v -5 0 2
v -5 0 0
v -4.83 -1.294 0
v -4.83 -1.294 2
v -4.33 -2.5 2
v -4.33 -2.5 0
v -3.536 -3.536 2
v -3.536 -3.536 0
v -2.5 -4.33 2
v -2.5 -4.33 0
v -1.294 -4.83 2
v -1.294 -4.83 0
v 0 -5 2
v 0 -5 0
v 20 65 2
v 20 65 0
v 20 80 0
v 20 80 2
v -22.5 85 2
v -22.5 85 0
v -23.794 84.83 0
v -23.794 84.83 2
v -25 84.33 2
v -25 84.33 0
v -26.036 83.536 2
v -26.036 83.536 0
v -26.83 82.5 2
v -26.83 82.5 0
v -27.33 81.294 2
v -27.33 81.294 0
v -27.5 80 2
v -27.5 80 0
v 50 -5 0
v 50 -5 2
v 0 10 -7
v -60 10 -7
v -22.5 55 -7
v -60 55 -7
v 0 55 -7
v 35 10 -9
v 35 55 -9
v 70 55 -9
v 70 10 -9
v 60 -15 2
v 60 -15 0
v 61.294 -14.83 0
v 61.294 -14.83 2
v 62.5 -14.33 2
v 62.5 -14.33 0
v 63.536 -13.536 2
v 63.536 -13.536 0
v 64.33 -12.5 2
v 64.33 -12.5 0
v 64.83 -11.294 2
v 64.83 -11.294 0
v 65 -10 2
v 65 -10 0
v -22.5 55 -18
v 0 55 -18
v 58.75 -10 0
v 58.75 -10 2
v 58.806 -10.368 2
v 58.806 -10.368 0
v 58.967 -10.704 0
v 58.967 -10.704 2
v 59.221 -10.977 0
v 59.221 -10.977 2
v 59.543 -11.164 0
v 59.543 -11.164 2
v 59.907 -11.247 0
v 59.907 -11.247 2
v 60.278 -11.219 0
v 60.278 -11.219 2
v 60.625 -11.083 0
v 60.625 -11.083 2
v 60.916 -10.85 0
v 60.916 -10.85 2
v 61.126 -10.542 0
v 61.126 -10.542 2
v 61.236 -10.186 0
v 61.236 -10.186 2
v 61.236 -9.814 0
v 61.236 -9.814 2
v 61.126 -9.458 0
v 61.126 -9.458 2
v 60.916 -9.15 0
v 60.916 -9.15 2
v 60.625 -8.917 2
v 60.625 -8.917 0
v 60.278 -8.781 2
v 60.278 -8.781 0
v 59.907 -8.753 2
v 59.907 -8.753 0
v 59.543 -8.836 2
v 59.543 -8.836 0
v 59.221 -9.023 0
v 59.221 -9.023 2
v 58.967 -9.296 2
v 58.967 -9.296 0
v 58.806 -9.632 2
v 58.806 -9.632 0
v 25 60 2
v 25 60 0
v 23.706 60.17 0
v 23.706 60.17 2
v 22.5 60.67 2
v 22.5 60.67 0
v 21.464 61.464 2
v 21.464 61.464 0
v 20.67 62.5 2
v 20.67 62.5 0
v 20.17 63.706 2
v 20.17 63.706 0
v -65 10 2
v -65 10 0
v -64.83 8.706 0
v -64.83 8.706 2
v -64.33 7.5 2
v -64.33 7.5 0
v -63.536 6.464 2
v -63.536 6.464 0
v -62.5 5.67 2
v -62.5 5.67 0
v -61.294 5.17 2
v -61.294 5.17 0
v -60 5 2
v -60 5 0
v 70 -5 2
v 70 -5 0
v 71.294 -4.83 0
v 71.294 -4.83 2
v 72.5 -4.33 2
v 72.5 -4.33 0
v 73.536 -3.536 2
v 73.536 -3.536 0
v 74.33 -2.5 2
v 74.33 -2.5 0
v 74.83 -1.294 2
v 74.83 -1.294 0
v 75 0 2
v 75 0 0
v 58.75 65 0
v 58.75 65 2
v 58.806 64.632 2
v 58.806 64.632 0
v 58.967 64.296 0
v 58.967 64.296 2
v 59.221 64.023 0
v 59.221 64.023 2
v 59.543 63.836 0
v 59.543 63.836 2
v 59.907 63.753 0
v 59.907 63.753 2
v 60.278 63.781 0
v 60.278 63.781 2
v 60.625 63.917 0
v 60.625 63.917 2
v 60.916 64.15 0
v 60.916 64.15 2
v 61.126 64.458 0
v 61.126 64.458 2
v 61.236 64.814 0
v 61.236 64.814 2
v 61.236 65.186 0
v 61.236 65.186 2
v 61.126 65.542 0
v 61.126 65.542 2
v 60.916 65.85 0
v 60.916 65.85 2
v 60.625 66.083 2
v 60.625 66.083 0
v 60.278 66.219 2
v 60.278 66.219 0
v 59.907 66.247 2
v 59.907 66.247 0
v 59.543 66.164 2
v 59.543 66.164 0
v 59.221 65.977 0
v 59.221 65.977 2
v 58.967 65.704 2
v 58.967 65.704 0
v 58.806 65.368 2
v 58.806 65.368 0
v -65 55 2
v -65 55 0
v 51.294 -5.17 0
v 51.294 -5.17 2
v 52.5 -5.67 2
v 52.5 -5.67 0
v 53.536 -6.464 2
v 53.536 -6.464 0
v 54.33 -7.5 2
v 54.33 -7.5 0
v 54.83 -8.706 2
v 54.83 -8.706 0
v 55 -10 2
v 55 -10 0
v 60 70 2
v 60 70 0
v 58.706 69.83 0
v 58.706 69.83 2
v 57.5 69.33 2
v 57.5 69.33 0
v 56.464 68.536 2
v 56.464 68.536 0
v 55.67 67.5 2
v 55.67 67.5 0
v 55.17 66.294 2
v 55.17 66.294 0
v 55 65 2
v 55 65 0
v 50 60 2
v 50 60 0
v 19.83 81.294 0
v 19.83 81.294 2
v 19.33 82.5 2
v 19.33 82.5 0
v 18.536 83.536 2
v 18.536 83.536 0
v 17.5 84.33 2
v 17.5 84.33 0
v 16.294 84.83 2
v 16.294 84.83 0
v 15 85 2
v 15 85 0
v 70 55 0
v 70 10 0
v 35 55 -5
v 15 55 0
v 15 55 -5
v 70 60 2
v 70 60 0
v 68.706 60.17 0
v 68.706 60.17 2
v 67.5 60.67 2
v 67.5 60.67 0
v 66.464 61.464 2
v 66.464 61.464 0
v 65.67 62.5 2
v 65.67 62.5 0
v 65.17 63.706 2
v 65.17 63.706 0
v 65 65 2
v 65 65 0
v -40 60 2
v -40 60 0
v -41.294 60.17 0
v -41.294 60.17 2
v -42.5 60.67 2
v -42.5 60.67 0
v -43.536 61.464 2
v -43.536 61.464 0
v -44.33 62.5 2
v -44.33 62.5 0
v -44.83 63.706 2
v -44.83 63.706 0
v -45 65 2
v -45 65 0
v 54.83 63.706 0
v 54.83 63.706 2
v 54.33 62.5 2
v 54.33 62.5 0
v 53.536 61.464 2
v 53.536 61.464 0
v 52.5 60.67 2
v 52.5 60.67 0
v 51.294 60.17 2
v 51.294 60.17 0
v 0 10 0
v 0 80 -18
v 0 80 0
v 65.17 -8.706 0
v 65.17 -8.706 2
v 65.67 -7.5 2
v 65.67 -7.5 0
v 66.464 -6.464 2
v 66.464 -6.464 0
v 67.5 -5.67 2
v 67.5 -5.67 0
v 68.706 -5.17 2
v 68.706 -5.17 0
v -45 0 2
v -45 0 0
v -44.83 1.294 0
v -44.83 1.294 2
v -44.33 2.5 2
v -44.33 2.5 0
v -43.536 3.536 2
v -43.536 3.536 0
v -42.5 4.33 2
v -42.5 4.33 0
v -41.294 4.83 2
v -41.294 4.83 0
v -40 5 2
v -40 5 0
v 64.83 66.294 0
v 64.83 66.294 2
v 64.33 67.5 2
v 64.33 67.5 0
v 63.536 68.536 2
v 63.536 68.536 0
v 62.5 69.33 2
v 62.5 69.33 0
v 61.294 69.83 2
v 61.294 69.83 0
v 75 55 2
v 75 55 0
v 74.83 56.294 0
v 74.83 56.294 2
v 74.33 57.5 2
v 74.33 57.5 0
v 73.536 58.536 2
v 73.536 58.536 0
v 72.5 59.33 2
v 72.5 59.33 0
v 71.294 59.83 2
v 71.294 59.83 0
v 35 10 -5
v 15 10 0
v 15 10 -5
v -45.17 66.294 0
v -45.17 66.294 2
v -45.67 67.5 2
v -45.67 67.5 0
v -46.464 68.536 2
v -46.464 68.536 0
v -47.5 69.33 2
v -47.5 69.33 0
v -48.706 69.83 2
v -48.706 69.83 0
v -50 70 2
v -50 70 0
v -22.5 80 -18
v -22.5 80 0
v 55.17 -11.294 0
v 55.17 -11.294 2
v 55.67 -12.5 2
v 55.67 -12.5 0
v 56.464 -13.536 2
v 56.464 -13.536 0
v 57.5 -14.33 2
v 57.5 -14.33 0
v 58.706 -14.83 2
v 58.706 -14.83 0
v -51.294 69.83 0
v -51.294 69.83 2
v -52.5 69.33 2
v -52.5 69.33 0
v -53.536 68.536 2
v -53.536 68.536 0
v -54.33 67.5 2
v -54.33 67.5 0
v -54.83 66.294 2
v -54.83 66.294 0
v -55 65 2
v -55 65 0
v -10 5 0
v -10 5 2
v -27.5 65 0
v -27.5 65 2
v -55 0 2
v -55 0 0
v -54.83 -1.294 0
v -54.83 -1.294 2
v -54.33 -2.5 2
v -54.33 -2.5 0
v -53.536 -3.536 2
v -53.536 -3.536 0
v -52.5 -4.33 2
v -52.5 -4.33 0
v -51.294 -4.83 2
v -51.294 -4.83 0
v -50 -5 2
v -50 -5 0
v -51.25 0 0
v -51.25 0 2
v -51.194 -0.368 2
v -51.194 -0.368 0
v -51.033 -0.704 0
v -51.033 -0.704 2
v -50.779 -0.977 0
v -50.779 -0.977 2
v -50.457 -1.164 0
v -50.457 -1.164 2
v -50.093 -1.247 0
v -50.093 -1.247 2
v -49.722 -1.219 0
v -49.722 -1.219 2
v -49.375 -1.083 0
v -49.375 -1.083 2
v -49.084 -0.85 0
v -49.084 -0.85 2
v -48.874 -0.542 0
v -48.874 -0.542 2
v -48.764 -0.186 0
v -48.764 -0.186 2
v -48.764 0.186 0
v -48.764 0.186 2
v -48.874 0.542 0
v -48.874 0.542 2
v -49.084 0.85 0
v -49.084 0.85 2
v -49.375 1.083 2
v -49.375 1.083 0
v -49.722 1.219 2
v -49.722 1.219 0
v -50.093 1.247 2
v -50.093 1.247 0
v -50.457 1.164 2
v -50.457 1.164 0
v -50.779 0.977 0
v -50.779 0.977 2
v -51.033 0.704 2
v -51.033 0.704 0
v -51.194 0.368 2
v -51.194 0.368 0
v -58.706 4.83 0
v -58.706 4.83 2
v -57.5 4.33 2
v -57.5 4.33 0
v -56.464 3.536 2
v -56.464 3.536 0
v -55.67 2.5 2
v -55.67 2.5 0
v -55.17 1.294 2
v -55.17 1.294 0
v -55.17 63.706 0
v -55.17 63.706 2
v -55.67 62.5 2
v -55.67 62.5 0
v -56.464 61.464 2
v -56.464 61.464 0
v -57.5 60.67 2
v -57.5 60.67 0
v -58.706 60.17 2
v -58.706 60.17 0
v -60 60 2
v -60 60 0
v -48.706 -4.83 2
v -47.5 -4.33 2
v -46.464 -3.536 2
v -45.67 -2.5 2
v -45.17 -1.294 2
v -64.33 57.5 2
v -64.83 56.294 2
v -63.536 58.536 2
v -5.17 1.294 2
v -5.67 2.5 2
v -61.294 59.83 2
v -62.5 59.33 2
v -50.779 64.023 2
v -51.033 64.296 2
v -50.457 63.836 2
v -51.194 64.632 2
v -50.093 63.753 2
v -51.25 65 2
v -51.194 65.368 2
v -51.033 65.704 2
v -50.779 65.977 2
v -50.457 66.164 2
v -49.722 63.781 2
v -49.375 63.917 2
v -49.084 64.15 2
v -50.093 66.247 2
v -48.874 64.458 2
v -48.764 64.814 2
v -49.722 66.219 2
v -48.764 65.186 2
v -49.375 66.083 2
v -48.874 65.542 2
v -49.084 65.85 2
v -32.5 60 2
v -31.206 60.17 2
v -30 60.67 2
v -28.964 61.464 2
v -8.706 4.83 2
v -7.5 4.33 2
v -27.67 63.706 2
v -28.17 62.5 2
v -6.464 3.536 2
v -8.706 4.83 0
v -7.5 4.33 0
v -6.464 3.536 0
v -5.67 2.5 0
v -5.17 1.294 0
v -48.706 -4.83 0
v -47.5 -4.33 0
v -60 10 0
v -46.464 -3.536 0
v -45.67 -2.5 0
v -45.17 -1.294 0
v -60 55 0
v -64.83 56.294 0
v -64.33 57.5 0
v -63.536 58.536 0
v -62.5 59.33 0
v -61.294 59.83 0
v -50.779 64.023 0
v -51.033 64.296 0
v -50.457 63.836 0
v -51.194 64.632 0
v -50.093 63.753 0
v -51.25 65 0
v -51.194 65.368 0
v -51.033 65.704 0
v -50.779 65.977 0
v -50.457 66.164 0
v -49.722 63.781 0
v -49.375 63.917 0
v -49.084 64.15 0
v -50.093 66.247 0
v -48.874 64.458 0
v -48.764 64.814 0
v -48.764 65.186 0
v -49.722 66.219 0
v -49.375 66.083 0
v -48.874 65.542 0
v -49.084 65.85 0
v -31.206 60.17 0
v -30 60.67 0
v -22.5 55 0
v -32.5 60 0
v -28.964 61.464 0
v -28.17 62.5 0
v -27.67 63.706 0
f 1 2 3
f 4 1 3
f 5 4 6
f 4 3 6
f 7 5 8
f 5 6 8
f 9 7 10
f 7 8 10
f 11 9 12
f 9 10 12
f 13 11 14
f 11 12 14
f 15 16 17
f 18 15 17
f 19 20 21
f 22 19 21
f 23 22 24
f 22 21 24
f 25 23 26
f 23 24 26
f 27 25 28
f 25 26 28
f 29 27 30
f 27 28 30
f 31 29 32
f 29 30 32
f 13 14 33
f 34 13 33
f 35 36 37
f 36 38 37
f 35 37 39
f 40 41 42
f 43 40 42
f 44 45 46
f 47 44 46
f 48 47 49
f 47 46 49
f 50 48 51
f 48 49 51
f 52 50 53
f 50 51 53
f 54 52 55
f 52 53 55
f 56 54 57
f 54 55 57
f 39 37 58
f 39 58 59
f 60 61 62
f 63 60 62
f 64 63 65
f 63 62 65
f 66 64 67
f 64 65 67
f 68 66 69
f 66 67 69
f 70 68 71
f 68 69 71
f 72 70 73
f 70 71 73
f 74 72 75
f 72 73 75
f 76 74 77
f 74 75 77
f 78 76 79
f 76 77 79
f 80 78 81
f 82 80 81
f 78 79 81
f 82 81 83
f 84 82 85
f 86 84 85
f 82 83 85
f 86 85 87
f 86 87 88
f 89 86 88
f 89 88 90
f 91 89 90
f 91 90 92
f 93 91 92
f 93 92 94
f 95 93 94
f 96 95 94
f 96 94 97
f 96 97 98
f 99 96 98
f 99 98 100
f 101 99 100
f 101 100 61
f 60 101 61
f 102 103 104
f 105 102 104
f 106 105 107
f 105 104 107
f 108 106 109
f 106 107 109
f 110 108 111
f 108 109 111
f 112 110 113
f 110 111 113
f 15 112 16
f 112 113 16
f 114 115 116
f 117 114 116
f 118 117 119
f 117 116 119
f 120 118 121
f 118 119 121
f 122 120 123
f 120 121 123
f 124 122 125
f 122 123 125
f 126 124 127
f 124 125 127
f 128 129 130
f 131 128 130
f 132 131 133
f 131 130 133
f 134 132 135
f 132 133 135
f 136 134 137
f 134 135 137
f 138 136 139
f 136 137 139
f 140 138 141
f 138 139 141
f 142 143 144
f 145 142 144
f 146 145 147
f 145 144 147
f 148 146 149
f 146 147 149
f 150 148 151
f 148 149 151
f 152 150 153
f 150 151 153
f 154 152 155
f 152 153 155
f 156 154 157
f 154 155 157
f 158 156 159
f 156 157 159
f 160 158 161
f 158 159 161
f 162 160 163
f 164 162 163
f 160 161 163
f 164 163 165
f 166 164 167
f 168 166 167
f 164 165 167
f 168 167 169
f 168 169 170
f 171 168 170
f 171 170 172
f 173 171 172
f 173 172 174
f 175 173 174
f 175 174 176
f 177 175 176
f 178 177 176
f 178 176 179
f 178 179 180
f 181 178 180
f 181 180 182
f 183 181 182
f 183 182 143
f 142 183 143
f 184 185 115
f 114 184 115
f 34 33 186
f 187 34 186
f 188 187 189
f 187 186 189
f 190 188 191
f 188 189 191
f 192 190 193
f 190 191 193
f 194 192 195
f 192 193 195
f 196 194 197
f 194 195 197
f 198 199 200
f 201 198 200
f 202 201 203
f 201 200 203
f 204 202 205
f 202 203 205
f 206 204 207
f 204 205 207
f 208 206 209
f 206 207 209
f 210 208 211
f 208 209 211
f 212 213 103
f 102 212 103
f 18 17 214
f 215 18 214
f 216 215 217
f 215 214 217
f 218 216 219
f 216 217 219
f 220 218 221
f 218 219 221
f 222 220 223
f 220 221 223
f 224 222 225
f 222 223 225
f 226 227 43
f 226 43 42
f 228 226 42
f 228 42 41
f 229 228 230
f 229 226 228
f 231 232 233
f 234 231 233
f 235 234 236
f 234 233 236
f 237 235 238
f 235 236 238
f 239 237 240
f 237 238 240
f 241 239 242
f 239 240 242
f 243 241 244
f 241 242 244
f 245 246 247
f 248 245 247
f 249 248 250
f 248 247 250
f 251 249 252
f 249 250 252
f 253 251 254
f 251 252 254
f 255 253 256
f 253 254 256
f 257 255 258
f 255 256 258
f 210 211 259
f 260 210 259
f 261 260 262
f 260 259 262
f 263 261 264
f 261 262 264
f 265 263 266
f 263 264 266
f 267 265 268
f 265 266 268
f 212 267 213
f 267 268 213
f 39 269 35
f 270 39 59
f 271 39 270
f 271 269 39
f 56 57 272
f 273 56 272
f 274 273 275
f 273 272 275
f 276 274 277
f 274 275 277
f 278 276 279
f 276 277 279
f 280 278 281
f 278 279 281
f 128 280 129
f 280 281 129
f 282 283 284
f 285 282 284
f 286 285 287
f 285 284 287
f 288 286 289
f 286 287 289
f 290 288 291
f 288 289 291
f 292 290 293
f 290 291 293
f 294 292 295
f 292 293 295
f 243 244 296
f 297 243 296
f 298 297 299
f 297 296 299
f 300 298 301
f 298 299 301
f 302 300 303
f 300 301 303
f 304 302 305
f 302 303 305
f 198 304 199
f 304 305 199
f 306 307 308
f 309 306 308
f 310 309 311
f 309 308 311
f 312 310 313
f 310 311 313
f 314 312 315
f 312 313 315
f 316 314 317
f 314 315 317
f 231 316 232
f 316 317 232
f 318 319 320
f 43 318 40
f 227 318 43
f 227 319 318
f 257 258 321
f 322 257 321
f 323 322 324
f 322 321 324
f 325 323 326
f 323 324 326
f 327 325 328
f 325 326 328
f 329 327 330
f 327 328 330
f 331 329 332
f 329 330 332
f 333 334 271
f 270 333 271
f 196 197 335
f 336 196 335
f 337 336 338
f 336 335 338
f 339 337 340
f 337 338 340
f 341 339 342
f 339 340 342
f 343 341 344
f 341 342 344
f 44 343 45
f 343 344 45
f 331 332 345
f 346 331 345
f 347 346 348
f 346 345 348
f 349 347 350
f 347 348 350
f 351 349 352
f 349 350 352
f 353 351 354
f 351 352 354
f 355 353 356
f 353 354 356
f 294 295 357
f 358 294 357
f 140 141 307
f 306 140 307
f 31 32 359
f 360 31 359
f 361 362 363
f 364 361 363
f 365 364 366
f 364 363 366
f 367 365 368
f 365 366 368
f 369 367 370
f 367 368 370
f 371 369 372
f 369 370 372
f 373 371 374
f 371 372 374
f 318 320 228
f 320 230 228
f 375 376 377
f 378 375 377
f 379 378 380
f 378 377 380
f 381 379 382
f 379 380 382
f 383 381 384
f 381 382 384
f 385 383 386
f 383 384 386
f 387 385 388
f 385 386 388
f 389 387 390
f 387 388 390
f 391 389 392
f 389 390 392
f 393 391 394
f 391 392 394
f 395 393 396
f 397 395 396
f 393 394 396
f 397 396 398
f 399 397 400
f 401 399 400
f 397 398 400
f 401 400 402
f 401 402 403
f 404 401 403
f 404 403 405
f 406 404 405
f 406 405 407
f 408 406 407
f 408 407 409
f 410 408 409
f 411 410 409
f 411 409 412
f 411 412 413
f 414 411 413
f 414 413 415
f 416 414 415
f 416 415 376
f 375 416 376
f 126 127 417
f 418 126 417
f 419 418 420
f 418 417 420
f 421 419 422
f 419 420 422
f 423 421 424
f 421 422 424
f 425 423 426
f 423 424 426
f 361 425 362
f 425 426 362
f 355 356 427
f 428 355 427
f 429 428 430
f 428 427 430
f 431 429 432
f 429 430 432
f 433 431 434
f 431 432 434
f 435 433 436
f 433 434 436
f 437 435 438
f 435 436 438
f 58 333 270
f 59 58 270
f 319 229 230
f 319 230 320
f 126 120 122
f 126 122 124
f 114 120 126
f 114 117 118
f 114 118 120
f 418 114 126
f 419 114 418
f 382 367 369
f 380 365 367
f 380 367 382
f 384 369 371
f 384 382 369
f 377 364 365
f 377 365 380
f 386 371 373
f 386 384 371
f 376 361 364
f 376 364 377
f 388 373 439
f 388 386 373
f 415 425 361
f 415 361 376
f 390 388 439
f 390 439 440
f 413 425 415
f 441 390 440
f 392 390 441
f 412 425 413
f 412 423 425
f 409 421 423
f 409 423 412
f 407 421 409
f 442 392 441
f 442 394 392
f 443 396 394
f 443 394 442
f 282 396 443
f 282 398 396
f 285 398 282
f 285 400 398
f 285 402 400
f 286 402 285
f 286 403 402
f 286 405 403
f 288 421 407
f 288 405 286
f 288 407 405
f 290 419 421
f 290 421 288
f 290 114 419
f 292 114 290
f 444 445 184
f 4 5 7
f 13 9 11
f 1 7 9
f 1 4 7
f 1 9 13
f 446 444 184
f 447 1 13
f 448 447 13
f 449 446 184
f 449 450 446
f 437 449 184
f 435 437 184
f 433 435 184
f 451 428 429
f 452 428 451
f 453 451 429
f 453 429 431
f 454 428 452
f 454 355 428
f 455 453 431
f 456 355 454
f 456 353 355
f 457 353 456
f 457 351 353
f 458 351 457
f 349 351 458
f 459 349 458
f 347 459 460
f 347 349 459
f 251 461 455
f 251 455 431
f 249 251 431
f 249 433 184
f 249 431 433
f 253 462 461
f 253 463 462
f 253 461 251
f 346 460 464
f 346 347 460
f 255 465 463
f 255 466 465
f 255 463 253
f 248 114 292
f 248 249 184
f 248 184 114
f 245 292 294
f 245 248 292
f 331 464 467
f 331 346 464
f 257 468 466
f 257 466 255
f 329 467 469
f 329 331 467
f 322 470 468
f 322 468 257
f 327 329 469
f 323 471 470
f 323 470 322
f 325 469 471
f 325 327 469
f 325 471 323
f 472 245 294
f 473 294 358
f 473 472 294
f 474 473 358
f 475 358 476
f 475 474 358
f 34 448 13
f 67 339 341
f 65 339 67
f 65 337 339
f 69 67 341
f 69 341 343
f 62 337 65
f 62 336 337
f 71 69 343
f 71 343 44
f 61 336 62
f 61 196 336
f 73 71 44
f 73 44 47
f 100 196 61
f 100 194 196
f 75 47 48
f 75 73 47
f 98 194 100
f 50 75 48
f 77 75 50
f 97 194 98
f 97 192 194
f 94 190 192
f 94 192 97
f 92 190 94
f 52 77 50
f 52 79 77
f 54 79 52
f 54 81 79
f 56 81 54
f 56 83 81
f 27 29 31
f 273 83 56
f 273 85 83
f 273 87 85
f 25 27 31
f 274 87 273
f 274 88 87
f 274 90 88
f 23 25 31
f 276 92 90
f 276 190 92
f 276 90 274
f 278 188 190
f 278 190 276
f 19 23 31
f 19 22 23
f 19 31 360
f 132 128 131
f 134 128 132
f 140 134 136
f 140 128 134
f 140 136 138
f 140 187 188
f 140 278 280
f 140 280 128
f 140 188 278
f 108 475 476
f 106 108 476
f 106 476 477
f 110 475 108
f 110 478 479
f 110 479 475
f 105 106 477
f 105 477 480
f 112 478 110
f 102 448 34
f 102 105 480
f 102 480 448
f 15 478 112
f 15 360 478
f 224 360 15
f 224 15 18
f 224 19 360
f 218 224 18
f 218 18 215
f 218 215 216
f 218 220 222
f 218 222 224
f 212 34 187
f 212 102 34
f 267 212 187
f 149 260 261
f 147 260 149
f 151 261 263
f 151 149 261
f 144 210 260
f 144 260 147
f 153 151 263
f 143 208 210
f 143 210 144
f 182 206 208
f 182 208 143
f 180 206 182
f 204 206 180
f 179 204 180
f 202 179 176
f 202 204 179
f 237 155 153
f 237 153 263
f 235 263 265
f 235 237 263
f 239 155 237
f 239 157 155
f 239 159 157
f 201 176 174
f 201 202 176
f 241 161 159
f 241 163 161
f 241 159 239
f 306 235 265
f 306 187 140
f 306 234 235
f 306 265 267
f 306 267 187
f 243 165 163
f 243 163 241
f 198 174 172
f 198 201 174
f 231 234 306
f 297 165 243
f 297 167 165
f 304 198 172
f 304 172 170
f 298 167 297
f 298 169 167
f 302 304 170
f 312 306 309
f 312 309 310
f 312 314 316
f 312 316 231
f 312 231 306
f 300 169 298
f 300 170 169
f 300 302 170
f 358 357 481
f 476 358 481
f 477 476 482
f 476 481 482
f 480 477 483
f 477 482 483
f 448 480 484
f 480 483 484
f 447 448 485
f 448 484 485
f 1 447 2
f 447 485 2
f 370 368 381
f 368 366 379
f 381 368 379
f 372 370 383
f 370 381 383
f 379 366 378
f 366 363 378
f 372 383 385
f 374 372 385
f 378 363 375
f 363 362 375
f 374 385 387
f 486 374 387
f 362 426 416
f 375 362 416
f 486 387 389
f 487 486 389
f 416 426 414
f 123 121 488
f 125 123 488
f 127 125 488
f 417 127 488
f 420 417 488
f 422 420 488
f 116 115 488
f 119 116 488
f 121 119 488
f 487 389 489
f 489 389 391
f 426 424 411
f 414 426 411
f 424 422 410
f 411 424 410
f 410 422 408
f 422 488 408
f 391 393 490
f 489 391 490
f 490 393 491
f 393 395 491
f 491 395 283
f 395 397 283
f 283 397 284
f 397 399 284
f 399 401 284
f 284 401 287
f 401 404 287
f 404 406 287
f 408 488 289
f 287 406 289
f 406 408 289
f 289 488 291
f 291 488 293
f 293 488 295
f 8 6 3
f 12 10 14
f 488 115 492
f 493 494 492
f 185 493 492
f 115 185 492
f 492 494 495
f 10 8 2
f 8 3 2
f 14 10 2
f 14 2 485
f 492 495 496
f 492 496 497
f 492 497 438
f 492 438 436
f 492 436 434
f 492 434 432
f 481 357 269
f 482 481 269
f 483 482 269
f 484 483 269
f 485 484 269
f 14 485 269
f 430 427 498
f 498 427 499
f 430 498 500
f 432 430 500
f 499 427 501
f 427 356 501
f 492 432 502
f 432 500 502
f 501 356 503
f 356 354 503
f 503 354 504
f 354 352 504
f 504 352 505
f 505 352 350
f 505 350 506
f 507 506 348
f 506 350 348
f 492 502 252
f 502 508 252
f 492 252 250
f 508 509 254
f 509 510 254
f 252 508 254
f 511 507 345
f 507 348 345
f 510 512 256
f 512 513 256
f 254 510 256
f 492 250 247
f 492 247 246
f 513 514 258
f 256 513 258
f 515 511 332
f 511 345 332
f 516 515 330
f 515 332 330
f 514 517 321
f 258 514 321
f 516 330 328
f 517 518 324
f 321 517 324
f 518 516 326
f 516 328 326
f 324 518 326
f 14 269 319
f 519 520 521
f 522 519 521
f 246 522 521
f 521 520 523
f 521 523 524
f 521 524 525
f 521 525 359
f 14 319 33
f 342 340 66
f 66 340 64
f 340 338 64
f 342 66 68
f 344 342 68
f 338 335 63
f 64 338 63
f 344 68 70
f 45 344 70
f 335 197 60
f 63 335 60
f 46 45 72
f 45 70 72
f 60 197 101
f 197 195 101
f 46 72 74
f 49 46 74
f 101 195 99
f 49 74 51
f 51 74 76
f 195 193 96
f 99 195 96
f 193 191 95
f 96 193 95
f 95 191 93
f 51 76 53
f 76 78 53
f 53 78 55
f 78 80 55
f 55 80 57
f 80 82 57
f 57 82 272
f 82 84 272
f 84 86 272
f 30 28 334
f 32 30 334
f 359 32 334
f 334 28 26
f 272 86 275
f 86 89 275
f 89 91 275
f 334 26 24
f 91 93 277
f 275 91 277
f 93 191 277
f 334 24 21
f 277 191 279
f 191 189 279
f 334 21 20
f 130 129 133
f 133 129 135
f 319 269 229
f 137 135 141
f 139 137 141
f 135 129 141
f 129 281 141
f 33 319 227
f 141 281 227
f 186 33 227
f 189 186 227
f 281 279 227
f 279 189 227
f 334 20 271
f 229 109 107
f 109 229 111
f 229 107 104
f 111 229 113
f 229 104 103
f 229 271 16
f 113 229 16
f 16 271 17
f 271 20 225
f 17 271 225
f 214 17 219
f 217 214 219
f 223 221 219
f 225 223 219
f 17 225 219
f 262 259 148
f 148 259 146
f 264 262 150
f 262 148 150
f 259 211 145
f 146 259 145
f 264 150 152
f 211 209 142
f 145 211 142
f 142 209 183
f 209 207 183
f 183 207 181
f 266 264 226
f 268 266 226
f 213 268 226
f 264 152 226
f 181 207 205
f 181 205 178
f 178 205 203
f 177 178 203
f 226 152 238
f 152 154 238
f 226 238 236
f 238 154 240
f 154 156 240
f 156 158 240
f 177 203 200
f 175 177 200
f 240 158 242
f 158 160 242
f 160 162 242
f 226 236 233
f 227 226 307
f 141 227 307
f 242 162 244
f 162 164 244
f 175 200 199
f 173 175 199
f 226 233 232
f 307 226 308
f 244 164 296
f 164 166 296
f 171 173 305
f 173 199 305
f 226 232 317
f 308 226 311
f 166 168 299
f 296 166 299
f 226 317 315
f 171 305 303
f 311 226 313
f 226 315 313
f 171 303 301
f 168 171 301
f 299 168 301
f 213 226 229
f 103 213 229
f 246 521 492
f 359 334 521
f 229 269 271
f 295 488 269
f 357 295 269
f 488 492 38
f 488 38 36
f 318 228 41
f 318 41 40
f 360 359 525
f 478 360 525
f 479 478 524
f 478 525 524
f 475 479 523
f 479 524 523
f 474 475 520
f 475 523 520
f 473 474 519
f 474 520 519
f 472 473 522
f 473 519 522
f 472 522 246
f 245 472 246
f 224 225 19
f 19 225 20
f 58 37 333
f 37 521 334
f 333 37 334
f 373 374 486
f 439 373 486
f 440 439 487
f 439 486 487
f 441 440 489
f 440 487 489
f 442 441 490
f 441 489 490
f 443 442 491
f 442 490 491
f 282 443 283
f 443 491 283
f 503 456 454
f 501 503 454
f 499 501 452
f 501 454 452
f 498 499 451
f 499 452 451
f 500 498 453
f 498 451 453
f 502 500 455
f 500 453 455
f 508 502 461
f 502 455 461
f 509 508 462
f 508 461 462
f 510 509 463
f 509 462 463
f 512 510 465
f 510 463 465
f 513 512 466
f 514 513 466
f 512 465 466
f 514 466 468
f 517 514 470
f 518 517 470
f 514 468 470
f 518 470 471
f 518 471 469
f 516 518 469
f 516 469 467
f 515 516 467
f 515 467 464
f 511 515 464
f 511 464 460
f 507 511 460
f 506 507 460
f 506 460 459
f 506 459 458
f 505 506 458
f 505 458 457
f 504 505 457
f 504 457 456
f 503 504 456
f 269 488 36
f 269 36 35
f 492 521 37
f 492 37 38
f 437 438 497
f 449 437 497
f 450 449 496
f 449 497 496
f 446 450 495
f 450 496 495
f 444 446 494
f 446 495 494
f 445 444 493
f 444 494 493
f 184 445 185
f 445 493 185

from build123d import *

# Parameters (mm, degrees)
F2_DEPTH = 2
F3_DEPTH = 9
F4_DEPTH = 5
F0_W     = 22.5
F0_H     = 25
F5_DEPTH = 18
F6_DEPTH = 7
F7_D     = 2.5


with BuildPart() as f2:
    # F1 (on Top) → F2 (new body)
    with BuildSketch(Plane.XY):
        with BuildLine():
            ThreePointArc((70, -5), (73.5355339059, -3.5355339059), (75, 0))
            Line((75, 0), (75, 55))
            ThreePointArc((75, 55), (73.5355339059, 58.5355339059), (70, 60))
            ThreePointArc((70, 60), (66.4644660941, 61.4644660941), (65, 65))
            ThreePointArc((65, 65), (63.5355339059, 68.5355339059), (60, 70))
            ThreePointArc((60, 70), (56.4644660941, 68.5355339059), (55, 65))
            ThreePointArc((55, 65), (53.5355339059, 61.4644660941), (50, 60))
            Line((50, 60), (25, 60))
            ThreePointArc((25, 60), (21.4644660941, 61.4644660941), (20, 65))
            Line((20, 65), (20, 80))
            ThreePointArc((20, 80), (18.5355339059, 83.5355339059), (15, 85))
            Line((15, 85), (-22.5, 85))
            ThreePointArc((-22.5, 85), (-26.0355339059, 83.5355339059), (-27.5, 80))
            Line((-27.5, 80), (-27.5, 65))
            ThreePointArc((-27.5, 65), (-28.9644660941, 61.4644660941), (-32.5, 60))
            Line((-32.5, 60), (-40, 60))
            ThreePointArc((-40, 60), (-43.5355339059, 61.4644660941), (-45, 65))
            ThreePointArc((-45, 65), (-46.4644660941, 68.5355339059), (-50, 70))
            ThreePointArc((-50, 70), (-53.5355339059, 68.5355339059), (-55, 65))
            ThreePointArc((-55, 65), (-56.4644660941, 61.4644660941), (-60, 60))
            ThreePointArc((-60, 60), (-63.5355339059, 58.5355339059), (-65, 55))
            Line((-65, 55), (-65, 10))
            ThreePointArc((-65, 10), (-63.5355339059, 6.4644660941), (-60, 5))
            ThreePointArc((-60, 5), (-56.4644660941, 3.5355339059), (-55, 0))
            ThreePointArc((-55, 0), (-53.5355339059, -3.5355339059), (-50, -5))
            ThreePointArc((-50, -5), (-46.4644660941, -3.5355339059), (-45, 0))
            ThreePointArc((-45, 0), (-43.5355339059, 3.5355339059), (-40, 5))
            Line((-40, 5), (-10, 5))
            ThreePointArc((-10, 5), (-6.4644660941, 3.5355339059), (-5, 0))
            ThreePointArc((-5, 0), (-3.5355339059, -3.5355339059), (0, -5))
            Line((0, -5), (50, -5))
            ThreePointArc((50, -5), (53.5355339059, -6.4644660941), (55, -10))
            ThreePointArc((55, -10), (56.4644660941, -13.5355339059), (60, -15))
            ThreePointArc((60, -15), (63.5355339059, -13.5355339059), (65, -10))
            ThreePointArc((65, -10), (66.4644660941, -6.4644660941), (70, -5))
        make_face()
        Polygon((-22.5, 55), (-22.5, 80), (15, 80), (15, 55), (70, 55), (70, 0), (0, 0), (0, 10), (-60, 10), (-60, 55), align=None, mode=Mode.SUBTRACT)
        Polygon((15, 80), (-22.5, 80), (-22.5, 55), (-60, 55), (-60, 10), (0, 10), (0, 0), (70, 0), (70, 55), (15, 55), align=None)
    extrude(amount=F2_DEPTH)

    # F0 (on Top) → F3 (join)
    with BuildSketch(Plane.XY):
        Polygon((35, 55), (35, 10), (70, 10), (70, 55), (40, 55), align=None)
    extrude(amount=-F3_DEPTH)

    # F0 (on Top) → F4 (join)
    with BuildSketch(Plane.XY):
        Polygon((15, 40), (15, 10), (35, 10), (35, 55), (15, 55), align=None)
    extrude(amount=-F4_DEPTH)

    # F0 (on Top) → F5 (join)
    with BuildSketch(Plane.XY):
        with Locations((-11.25, 67.5)):
            Rectangle(F0_W, F0_H)
    extrude(amount=-F5_DEPTH)

    # F0 (on Top) → F6 (join)
    with BuildSketch(Plane.XY):
        Polygon((-60, 10), (0, 10), (0, 40), (0, 55), (-22.5, 55), (-60, 55), align=None)
    extrude(amount=-F6_DEPTH)

    # F7 (through all)
    with Locations(Plane(origin=(0, 0, 0), x_dir=(1, 0, 0), z_dir=(0, 0, -1))):
        with Locations((60, -65), (-50, -65), (-50, 0), (60, 10)):
            Hole(F7_D / 2)


solid = f2.part
